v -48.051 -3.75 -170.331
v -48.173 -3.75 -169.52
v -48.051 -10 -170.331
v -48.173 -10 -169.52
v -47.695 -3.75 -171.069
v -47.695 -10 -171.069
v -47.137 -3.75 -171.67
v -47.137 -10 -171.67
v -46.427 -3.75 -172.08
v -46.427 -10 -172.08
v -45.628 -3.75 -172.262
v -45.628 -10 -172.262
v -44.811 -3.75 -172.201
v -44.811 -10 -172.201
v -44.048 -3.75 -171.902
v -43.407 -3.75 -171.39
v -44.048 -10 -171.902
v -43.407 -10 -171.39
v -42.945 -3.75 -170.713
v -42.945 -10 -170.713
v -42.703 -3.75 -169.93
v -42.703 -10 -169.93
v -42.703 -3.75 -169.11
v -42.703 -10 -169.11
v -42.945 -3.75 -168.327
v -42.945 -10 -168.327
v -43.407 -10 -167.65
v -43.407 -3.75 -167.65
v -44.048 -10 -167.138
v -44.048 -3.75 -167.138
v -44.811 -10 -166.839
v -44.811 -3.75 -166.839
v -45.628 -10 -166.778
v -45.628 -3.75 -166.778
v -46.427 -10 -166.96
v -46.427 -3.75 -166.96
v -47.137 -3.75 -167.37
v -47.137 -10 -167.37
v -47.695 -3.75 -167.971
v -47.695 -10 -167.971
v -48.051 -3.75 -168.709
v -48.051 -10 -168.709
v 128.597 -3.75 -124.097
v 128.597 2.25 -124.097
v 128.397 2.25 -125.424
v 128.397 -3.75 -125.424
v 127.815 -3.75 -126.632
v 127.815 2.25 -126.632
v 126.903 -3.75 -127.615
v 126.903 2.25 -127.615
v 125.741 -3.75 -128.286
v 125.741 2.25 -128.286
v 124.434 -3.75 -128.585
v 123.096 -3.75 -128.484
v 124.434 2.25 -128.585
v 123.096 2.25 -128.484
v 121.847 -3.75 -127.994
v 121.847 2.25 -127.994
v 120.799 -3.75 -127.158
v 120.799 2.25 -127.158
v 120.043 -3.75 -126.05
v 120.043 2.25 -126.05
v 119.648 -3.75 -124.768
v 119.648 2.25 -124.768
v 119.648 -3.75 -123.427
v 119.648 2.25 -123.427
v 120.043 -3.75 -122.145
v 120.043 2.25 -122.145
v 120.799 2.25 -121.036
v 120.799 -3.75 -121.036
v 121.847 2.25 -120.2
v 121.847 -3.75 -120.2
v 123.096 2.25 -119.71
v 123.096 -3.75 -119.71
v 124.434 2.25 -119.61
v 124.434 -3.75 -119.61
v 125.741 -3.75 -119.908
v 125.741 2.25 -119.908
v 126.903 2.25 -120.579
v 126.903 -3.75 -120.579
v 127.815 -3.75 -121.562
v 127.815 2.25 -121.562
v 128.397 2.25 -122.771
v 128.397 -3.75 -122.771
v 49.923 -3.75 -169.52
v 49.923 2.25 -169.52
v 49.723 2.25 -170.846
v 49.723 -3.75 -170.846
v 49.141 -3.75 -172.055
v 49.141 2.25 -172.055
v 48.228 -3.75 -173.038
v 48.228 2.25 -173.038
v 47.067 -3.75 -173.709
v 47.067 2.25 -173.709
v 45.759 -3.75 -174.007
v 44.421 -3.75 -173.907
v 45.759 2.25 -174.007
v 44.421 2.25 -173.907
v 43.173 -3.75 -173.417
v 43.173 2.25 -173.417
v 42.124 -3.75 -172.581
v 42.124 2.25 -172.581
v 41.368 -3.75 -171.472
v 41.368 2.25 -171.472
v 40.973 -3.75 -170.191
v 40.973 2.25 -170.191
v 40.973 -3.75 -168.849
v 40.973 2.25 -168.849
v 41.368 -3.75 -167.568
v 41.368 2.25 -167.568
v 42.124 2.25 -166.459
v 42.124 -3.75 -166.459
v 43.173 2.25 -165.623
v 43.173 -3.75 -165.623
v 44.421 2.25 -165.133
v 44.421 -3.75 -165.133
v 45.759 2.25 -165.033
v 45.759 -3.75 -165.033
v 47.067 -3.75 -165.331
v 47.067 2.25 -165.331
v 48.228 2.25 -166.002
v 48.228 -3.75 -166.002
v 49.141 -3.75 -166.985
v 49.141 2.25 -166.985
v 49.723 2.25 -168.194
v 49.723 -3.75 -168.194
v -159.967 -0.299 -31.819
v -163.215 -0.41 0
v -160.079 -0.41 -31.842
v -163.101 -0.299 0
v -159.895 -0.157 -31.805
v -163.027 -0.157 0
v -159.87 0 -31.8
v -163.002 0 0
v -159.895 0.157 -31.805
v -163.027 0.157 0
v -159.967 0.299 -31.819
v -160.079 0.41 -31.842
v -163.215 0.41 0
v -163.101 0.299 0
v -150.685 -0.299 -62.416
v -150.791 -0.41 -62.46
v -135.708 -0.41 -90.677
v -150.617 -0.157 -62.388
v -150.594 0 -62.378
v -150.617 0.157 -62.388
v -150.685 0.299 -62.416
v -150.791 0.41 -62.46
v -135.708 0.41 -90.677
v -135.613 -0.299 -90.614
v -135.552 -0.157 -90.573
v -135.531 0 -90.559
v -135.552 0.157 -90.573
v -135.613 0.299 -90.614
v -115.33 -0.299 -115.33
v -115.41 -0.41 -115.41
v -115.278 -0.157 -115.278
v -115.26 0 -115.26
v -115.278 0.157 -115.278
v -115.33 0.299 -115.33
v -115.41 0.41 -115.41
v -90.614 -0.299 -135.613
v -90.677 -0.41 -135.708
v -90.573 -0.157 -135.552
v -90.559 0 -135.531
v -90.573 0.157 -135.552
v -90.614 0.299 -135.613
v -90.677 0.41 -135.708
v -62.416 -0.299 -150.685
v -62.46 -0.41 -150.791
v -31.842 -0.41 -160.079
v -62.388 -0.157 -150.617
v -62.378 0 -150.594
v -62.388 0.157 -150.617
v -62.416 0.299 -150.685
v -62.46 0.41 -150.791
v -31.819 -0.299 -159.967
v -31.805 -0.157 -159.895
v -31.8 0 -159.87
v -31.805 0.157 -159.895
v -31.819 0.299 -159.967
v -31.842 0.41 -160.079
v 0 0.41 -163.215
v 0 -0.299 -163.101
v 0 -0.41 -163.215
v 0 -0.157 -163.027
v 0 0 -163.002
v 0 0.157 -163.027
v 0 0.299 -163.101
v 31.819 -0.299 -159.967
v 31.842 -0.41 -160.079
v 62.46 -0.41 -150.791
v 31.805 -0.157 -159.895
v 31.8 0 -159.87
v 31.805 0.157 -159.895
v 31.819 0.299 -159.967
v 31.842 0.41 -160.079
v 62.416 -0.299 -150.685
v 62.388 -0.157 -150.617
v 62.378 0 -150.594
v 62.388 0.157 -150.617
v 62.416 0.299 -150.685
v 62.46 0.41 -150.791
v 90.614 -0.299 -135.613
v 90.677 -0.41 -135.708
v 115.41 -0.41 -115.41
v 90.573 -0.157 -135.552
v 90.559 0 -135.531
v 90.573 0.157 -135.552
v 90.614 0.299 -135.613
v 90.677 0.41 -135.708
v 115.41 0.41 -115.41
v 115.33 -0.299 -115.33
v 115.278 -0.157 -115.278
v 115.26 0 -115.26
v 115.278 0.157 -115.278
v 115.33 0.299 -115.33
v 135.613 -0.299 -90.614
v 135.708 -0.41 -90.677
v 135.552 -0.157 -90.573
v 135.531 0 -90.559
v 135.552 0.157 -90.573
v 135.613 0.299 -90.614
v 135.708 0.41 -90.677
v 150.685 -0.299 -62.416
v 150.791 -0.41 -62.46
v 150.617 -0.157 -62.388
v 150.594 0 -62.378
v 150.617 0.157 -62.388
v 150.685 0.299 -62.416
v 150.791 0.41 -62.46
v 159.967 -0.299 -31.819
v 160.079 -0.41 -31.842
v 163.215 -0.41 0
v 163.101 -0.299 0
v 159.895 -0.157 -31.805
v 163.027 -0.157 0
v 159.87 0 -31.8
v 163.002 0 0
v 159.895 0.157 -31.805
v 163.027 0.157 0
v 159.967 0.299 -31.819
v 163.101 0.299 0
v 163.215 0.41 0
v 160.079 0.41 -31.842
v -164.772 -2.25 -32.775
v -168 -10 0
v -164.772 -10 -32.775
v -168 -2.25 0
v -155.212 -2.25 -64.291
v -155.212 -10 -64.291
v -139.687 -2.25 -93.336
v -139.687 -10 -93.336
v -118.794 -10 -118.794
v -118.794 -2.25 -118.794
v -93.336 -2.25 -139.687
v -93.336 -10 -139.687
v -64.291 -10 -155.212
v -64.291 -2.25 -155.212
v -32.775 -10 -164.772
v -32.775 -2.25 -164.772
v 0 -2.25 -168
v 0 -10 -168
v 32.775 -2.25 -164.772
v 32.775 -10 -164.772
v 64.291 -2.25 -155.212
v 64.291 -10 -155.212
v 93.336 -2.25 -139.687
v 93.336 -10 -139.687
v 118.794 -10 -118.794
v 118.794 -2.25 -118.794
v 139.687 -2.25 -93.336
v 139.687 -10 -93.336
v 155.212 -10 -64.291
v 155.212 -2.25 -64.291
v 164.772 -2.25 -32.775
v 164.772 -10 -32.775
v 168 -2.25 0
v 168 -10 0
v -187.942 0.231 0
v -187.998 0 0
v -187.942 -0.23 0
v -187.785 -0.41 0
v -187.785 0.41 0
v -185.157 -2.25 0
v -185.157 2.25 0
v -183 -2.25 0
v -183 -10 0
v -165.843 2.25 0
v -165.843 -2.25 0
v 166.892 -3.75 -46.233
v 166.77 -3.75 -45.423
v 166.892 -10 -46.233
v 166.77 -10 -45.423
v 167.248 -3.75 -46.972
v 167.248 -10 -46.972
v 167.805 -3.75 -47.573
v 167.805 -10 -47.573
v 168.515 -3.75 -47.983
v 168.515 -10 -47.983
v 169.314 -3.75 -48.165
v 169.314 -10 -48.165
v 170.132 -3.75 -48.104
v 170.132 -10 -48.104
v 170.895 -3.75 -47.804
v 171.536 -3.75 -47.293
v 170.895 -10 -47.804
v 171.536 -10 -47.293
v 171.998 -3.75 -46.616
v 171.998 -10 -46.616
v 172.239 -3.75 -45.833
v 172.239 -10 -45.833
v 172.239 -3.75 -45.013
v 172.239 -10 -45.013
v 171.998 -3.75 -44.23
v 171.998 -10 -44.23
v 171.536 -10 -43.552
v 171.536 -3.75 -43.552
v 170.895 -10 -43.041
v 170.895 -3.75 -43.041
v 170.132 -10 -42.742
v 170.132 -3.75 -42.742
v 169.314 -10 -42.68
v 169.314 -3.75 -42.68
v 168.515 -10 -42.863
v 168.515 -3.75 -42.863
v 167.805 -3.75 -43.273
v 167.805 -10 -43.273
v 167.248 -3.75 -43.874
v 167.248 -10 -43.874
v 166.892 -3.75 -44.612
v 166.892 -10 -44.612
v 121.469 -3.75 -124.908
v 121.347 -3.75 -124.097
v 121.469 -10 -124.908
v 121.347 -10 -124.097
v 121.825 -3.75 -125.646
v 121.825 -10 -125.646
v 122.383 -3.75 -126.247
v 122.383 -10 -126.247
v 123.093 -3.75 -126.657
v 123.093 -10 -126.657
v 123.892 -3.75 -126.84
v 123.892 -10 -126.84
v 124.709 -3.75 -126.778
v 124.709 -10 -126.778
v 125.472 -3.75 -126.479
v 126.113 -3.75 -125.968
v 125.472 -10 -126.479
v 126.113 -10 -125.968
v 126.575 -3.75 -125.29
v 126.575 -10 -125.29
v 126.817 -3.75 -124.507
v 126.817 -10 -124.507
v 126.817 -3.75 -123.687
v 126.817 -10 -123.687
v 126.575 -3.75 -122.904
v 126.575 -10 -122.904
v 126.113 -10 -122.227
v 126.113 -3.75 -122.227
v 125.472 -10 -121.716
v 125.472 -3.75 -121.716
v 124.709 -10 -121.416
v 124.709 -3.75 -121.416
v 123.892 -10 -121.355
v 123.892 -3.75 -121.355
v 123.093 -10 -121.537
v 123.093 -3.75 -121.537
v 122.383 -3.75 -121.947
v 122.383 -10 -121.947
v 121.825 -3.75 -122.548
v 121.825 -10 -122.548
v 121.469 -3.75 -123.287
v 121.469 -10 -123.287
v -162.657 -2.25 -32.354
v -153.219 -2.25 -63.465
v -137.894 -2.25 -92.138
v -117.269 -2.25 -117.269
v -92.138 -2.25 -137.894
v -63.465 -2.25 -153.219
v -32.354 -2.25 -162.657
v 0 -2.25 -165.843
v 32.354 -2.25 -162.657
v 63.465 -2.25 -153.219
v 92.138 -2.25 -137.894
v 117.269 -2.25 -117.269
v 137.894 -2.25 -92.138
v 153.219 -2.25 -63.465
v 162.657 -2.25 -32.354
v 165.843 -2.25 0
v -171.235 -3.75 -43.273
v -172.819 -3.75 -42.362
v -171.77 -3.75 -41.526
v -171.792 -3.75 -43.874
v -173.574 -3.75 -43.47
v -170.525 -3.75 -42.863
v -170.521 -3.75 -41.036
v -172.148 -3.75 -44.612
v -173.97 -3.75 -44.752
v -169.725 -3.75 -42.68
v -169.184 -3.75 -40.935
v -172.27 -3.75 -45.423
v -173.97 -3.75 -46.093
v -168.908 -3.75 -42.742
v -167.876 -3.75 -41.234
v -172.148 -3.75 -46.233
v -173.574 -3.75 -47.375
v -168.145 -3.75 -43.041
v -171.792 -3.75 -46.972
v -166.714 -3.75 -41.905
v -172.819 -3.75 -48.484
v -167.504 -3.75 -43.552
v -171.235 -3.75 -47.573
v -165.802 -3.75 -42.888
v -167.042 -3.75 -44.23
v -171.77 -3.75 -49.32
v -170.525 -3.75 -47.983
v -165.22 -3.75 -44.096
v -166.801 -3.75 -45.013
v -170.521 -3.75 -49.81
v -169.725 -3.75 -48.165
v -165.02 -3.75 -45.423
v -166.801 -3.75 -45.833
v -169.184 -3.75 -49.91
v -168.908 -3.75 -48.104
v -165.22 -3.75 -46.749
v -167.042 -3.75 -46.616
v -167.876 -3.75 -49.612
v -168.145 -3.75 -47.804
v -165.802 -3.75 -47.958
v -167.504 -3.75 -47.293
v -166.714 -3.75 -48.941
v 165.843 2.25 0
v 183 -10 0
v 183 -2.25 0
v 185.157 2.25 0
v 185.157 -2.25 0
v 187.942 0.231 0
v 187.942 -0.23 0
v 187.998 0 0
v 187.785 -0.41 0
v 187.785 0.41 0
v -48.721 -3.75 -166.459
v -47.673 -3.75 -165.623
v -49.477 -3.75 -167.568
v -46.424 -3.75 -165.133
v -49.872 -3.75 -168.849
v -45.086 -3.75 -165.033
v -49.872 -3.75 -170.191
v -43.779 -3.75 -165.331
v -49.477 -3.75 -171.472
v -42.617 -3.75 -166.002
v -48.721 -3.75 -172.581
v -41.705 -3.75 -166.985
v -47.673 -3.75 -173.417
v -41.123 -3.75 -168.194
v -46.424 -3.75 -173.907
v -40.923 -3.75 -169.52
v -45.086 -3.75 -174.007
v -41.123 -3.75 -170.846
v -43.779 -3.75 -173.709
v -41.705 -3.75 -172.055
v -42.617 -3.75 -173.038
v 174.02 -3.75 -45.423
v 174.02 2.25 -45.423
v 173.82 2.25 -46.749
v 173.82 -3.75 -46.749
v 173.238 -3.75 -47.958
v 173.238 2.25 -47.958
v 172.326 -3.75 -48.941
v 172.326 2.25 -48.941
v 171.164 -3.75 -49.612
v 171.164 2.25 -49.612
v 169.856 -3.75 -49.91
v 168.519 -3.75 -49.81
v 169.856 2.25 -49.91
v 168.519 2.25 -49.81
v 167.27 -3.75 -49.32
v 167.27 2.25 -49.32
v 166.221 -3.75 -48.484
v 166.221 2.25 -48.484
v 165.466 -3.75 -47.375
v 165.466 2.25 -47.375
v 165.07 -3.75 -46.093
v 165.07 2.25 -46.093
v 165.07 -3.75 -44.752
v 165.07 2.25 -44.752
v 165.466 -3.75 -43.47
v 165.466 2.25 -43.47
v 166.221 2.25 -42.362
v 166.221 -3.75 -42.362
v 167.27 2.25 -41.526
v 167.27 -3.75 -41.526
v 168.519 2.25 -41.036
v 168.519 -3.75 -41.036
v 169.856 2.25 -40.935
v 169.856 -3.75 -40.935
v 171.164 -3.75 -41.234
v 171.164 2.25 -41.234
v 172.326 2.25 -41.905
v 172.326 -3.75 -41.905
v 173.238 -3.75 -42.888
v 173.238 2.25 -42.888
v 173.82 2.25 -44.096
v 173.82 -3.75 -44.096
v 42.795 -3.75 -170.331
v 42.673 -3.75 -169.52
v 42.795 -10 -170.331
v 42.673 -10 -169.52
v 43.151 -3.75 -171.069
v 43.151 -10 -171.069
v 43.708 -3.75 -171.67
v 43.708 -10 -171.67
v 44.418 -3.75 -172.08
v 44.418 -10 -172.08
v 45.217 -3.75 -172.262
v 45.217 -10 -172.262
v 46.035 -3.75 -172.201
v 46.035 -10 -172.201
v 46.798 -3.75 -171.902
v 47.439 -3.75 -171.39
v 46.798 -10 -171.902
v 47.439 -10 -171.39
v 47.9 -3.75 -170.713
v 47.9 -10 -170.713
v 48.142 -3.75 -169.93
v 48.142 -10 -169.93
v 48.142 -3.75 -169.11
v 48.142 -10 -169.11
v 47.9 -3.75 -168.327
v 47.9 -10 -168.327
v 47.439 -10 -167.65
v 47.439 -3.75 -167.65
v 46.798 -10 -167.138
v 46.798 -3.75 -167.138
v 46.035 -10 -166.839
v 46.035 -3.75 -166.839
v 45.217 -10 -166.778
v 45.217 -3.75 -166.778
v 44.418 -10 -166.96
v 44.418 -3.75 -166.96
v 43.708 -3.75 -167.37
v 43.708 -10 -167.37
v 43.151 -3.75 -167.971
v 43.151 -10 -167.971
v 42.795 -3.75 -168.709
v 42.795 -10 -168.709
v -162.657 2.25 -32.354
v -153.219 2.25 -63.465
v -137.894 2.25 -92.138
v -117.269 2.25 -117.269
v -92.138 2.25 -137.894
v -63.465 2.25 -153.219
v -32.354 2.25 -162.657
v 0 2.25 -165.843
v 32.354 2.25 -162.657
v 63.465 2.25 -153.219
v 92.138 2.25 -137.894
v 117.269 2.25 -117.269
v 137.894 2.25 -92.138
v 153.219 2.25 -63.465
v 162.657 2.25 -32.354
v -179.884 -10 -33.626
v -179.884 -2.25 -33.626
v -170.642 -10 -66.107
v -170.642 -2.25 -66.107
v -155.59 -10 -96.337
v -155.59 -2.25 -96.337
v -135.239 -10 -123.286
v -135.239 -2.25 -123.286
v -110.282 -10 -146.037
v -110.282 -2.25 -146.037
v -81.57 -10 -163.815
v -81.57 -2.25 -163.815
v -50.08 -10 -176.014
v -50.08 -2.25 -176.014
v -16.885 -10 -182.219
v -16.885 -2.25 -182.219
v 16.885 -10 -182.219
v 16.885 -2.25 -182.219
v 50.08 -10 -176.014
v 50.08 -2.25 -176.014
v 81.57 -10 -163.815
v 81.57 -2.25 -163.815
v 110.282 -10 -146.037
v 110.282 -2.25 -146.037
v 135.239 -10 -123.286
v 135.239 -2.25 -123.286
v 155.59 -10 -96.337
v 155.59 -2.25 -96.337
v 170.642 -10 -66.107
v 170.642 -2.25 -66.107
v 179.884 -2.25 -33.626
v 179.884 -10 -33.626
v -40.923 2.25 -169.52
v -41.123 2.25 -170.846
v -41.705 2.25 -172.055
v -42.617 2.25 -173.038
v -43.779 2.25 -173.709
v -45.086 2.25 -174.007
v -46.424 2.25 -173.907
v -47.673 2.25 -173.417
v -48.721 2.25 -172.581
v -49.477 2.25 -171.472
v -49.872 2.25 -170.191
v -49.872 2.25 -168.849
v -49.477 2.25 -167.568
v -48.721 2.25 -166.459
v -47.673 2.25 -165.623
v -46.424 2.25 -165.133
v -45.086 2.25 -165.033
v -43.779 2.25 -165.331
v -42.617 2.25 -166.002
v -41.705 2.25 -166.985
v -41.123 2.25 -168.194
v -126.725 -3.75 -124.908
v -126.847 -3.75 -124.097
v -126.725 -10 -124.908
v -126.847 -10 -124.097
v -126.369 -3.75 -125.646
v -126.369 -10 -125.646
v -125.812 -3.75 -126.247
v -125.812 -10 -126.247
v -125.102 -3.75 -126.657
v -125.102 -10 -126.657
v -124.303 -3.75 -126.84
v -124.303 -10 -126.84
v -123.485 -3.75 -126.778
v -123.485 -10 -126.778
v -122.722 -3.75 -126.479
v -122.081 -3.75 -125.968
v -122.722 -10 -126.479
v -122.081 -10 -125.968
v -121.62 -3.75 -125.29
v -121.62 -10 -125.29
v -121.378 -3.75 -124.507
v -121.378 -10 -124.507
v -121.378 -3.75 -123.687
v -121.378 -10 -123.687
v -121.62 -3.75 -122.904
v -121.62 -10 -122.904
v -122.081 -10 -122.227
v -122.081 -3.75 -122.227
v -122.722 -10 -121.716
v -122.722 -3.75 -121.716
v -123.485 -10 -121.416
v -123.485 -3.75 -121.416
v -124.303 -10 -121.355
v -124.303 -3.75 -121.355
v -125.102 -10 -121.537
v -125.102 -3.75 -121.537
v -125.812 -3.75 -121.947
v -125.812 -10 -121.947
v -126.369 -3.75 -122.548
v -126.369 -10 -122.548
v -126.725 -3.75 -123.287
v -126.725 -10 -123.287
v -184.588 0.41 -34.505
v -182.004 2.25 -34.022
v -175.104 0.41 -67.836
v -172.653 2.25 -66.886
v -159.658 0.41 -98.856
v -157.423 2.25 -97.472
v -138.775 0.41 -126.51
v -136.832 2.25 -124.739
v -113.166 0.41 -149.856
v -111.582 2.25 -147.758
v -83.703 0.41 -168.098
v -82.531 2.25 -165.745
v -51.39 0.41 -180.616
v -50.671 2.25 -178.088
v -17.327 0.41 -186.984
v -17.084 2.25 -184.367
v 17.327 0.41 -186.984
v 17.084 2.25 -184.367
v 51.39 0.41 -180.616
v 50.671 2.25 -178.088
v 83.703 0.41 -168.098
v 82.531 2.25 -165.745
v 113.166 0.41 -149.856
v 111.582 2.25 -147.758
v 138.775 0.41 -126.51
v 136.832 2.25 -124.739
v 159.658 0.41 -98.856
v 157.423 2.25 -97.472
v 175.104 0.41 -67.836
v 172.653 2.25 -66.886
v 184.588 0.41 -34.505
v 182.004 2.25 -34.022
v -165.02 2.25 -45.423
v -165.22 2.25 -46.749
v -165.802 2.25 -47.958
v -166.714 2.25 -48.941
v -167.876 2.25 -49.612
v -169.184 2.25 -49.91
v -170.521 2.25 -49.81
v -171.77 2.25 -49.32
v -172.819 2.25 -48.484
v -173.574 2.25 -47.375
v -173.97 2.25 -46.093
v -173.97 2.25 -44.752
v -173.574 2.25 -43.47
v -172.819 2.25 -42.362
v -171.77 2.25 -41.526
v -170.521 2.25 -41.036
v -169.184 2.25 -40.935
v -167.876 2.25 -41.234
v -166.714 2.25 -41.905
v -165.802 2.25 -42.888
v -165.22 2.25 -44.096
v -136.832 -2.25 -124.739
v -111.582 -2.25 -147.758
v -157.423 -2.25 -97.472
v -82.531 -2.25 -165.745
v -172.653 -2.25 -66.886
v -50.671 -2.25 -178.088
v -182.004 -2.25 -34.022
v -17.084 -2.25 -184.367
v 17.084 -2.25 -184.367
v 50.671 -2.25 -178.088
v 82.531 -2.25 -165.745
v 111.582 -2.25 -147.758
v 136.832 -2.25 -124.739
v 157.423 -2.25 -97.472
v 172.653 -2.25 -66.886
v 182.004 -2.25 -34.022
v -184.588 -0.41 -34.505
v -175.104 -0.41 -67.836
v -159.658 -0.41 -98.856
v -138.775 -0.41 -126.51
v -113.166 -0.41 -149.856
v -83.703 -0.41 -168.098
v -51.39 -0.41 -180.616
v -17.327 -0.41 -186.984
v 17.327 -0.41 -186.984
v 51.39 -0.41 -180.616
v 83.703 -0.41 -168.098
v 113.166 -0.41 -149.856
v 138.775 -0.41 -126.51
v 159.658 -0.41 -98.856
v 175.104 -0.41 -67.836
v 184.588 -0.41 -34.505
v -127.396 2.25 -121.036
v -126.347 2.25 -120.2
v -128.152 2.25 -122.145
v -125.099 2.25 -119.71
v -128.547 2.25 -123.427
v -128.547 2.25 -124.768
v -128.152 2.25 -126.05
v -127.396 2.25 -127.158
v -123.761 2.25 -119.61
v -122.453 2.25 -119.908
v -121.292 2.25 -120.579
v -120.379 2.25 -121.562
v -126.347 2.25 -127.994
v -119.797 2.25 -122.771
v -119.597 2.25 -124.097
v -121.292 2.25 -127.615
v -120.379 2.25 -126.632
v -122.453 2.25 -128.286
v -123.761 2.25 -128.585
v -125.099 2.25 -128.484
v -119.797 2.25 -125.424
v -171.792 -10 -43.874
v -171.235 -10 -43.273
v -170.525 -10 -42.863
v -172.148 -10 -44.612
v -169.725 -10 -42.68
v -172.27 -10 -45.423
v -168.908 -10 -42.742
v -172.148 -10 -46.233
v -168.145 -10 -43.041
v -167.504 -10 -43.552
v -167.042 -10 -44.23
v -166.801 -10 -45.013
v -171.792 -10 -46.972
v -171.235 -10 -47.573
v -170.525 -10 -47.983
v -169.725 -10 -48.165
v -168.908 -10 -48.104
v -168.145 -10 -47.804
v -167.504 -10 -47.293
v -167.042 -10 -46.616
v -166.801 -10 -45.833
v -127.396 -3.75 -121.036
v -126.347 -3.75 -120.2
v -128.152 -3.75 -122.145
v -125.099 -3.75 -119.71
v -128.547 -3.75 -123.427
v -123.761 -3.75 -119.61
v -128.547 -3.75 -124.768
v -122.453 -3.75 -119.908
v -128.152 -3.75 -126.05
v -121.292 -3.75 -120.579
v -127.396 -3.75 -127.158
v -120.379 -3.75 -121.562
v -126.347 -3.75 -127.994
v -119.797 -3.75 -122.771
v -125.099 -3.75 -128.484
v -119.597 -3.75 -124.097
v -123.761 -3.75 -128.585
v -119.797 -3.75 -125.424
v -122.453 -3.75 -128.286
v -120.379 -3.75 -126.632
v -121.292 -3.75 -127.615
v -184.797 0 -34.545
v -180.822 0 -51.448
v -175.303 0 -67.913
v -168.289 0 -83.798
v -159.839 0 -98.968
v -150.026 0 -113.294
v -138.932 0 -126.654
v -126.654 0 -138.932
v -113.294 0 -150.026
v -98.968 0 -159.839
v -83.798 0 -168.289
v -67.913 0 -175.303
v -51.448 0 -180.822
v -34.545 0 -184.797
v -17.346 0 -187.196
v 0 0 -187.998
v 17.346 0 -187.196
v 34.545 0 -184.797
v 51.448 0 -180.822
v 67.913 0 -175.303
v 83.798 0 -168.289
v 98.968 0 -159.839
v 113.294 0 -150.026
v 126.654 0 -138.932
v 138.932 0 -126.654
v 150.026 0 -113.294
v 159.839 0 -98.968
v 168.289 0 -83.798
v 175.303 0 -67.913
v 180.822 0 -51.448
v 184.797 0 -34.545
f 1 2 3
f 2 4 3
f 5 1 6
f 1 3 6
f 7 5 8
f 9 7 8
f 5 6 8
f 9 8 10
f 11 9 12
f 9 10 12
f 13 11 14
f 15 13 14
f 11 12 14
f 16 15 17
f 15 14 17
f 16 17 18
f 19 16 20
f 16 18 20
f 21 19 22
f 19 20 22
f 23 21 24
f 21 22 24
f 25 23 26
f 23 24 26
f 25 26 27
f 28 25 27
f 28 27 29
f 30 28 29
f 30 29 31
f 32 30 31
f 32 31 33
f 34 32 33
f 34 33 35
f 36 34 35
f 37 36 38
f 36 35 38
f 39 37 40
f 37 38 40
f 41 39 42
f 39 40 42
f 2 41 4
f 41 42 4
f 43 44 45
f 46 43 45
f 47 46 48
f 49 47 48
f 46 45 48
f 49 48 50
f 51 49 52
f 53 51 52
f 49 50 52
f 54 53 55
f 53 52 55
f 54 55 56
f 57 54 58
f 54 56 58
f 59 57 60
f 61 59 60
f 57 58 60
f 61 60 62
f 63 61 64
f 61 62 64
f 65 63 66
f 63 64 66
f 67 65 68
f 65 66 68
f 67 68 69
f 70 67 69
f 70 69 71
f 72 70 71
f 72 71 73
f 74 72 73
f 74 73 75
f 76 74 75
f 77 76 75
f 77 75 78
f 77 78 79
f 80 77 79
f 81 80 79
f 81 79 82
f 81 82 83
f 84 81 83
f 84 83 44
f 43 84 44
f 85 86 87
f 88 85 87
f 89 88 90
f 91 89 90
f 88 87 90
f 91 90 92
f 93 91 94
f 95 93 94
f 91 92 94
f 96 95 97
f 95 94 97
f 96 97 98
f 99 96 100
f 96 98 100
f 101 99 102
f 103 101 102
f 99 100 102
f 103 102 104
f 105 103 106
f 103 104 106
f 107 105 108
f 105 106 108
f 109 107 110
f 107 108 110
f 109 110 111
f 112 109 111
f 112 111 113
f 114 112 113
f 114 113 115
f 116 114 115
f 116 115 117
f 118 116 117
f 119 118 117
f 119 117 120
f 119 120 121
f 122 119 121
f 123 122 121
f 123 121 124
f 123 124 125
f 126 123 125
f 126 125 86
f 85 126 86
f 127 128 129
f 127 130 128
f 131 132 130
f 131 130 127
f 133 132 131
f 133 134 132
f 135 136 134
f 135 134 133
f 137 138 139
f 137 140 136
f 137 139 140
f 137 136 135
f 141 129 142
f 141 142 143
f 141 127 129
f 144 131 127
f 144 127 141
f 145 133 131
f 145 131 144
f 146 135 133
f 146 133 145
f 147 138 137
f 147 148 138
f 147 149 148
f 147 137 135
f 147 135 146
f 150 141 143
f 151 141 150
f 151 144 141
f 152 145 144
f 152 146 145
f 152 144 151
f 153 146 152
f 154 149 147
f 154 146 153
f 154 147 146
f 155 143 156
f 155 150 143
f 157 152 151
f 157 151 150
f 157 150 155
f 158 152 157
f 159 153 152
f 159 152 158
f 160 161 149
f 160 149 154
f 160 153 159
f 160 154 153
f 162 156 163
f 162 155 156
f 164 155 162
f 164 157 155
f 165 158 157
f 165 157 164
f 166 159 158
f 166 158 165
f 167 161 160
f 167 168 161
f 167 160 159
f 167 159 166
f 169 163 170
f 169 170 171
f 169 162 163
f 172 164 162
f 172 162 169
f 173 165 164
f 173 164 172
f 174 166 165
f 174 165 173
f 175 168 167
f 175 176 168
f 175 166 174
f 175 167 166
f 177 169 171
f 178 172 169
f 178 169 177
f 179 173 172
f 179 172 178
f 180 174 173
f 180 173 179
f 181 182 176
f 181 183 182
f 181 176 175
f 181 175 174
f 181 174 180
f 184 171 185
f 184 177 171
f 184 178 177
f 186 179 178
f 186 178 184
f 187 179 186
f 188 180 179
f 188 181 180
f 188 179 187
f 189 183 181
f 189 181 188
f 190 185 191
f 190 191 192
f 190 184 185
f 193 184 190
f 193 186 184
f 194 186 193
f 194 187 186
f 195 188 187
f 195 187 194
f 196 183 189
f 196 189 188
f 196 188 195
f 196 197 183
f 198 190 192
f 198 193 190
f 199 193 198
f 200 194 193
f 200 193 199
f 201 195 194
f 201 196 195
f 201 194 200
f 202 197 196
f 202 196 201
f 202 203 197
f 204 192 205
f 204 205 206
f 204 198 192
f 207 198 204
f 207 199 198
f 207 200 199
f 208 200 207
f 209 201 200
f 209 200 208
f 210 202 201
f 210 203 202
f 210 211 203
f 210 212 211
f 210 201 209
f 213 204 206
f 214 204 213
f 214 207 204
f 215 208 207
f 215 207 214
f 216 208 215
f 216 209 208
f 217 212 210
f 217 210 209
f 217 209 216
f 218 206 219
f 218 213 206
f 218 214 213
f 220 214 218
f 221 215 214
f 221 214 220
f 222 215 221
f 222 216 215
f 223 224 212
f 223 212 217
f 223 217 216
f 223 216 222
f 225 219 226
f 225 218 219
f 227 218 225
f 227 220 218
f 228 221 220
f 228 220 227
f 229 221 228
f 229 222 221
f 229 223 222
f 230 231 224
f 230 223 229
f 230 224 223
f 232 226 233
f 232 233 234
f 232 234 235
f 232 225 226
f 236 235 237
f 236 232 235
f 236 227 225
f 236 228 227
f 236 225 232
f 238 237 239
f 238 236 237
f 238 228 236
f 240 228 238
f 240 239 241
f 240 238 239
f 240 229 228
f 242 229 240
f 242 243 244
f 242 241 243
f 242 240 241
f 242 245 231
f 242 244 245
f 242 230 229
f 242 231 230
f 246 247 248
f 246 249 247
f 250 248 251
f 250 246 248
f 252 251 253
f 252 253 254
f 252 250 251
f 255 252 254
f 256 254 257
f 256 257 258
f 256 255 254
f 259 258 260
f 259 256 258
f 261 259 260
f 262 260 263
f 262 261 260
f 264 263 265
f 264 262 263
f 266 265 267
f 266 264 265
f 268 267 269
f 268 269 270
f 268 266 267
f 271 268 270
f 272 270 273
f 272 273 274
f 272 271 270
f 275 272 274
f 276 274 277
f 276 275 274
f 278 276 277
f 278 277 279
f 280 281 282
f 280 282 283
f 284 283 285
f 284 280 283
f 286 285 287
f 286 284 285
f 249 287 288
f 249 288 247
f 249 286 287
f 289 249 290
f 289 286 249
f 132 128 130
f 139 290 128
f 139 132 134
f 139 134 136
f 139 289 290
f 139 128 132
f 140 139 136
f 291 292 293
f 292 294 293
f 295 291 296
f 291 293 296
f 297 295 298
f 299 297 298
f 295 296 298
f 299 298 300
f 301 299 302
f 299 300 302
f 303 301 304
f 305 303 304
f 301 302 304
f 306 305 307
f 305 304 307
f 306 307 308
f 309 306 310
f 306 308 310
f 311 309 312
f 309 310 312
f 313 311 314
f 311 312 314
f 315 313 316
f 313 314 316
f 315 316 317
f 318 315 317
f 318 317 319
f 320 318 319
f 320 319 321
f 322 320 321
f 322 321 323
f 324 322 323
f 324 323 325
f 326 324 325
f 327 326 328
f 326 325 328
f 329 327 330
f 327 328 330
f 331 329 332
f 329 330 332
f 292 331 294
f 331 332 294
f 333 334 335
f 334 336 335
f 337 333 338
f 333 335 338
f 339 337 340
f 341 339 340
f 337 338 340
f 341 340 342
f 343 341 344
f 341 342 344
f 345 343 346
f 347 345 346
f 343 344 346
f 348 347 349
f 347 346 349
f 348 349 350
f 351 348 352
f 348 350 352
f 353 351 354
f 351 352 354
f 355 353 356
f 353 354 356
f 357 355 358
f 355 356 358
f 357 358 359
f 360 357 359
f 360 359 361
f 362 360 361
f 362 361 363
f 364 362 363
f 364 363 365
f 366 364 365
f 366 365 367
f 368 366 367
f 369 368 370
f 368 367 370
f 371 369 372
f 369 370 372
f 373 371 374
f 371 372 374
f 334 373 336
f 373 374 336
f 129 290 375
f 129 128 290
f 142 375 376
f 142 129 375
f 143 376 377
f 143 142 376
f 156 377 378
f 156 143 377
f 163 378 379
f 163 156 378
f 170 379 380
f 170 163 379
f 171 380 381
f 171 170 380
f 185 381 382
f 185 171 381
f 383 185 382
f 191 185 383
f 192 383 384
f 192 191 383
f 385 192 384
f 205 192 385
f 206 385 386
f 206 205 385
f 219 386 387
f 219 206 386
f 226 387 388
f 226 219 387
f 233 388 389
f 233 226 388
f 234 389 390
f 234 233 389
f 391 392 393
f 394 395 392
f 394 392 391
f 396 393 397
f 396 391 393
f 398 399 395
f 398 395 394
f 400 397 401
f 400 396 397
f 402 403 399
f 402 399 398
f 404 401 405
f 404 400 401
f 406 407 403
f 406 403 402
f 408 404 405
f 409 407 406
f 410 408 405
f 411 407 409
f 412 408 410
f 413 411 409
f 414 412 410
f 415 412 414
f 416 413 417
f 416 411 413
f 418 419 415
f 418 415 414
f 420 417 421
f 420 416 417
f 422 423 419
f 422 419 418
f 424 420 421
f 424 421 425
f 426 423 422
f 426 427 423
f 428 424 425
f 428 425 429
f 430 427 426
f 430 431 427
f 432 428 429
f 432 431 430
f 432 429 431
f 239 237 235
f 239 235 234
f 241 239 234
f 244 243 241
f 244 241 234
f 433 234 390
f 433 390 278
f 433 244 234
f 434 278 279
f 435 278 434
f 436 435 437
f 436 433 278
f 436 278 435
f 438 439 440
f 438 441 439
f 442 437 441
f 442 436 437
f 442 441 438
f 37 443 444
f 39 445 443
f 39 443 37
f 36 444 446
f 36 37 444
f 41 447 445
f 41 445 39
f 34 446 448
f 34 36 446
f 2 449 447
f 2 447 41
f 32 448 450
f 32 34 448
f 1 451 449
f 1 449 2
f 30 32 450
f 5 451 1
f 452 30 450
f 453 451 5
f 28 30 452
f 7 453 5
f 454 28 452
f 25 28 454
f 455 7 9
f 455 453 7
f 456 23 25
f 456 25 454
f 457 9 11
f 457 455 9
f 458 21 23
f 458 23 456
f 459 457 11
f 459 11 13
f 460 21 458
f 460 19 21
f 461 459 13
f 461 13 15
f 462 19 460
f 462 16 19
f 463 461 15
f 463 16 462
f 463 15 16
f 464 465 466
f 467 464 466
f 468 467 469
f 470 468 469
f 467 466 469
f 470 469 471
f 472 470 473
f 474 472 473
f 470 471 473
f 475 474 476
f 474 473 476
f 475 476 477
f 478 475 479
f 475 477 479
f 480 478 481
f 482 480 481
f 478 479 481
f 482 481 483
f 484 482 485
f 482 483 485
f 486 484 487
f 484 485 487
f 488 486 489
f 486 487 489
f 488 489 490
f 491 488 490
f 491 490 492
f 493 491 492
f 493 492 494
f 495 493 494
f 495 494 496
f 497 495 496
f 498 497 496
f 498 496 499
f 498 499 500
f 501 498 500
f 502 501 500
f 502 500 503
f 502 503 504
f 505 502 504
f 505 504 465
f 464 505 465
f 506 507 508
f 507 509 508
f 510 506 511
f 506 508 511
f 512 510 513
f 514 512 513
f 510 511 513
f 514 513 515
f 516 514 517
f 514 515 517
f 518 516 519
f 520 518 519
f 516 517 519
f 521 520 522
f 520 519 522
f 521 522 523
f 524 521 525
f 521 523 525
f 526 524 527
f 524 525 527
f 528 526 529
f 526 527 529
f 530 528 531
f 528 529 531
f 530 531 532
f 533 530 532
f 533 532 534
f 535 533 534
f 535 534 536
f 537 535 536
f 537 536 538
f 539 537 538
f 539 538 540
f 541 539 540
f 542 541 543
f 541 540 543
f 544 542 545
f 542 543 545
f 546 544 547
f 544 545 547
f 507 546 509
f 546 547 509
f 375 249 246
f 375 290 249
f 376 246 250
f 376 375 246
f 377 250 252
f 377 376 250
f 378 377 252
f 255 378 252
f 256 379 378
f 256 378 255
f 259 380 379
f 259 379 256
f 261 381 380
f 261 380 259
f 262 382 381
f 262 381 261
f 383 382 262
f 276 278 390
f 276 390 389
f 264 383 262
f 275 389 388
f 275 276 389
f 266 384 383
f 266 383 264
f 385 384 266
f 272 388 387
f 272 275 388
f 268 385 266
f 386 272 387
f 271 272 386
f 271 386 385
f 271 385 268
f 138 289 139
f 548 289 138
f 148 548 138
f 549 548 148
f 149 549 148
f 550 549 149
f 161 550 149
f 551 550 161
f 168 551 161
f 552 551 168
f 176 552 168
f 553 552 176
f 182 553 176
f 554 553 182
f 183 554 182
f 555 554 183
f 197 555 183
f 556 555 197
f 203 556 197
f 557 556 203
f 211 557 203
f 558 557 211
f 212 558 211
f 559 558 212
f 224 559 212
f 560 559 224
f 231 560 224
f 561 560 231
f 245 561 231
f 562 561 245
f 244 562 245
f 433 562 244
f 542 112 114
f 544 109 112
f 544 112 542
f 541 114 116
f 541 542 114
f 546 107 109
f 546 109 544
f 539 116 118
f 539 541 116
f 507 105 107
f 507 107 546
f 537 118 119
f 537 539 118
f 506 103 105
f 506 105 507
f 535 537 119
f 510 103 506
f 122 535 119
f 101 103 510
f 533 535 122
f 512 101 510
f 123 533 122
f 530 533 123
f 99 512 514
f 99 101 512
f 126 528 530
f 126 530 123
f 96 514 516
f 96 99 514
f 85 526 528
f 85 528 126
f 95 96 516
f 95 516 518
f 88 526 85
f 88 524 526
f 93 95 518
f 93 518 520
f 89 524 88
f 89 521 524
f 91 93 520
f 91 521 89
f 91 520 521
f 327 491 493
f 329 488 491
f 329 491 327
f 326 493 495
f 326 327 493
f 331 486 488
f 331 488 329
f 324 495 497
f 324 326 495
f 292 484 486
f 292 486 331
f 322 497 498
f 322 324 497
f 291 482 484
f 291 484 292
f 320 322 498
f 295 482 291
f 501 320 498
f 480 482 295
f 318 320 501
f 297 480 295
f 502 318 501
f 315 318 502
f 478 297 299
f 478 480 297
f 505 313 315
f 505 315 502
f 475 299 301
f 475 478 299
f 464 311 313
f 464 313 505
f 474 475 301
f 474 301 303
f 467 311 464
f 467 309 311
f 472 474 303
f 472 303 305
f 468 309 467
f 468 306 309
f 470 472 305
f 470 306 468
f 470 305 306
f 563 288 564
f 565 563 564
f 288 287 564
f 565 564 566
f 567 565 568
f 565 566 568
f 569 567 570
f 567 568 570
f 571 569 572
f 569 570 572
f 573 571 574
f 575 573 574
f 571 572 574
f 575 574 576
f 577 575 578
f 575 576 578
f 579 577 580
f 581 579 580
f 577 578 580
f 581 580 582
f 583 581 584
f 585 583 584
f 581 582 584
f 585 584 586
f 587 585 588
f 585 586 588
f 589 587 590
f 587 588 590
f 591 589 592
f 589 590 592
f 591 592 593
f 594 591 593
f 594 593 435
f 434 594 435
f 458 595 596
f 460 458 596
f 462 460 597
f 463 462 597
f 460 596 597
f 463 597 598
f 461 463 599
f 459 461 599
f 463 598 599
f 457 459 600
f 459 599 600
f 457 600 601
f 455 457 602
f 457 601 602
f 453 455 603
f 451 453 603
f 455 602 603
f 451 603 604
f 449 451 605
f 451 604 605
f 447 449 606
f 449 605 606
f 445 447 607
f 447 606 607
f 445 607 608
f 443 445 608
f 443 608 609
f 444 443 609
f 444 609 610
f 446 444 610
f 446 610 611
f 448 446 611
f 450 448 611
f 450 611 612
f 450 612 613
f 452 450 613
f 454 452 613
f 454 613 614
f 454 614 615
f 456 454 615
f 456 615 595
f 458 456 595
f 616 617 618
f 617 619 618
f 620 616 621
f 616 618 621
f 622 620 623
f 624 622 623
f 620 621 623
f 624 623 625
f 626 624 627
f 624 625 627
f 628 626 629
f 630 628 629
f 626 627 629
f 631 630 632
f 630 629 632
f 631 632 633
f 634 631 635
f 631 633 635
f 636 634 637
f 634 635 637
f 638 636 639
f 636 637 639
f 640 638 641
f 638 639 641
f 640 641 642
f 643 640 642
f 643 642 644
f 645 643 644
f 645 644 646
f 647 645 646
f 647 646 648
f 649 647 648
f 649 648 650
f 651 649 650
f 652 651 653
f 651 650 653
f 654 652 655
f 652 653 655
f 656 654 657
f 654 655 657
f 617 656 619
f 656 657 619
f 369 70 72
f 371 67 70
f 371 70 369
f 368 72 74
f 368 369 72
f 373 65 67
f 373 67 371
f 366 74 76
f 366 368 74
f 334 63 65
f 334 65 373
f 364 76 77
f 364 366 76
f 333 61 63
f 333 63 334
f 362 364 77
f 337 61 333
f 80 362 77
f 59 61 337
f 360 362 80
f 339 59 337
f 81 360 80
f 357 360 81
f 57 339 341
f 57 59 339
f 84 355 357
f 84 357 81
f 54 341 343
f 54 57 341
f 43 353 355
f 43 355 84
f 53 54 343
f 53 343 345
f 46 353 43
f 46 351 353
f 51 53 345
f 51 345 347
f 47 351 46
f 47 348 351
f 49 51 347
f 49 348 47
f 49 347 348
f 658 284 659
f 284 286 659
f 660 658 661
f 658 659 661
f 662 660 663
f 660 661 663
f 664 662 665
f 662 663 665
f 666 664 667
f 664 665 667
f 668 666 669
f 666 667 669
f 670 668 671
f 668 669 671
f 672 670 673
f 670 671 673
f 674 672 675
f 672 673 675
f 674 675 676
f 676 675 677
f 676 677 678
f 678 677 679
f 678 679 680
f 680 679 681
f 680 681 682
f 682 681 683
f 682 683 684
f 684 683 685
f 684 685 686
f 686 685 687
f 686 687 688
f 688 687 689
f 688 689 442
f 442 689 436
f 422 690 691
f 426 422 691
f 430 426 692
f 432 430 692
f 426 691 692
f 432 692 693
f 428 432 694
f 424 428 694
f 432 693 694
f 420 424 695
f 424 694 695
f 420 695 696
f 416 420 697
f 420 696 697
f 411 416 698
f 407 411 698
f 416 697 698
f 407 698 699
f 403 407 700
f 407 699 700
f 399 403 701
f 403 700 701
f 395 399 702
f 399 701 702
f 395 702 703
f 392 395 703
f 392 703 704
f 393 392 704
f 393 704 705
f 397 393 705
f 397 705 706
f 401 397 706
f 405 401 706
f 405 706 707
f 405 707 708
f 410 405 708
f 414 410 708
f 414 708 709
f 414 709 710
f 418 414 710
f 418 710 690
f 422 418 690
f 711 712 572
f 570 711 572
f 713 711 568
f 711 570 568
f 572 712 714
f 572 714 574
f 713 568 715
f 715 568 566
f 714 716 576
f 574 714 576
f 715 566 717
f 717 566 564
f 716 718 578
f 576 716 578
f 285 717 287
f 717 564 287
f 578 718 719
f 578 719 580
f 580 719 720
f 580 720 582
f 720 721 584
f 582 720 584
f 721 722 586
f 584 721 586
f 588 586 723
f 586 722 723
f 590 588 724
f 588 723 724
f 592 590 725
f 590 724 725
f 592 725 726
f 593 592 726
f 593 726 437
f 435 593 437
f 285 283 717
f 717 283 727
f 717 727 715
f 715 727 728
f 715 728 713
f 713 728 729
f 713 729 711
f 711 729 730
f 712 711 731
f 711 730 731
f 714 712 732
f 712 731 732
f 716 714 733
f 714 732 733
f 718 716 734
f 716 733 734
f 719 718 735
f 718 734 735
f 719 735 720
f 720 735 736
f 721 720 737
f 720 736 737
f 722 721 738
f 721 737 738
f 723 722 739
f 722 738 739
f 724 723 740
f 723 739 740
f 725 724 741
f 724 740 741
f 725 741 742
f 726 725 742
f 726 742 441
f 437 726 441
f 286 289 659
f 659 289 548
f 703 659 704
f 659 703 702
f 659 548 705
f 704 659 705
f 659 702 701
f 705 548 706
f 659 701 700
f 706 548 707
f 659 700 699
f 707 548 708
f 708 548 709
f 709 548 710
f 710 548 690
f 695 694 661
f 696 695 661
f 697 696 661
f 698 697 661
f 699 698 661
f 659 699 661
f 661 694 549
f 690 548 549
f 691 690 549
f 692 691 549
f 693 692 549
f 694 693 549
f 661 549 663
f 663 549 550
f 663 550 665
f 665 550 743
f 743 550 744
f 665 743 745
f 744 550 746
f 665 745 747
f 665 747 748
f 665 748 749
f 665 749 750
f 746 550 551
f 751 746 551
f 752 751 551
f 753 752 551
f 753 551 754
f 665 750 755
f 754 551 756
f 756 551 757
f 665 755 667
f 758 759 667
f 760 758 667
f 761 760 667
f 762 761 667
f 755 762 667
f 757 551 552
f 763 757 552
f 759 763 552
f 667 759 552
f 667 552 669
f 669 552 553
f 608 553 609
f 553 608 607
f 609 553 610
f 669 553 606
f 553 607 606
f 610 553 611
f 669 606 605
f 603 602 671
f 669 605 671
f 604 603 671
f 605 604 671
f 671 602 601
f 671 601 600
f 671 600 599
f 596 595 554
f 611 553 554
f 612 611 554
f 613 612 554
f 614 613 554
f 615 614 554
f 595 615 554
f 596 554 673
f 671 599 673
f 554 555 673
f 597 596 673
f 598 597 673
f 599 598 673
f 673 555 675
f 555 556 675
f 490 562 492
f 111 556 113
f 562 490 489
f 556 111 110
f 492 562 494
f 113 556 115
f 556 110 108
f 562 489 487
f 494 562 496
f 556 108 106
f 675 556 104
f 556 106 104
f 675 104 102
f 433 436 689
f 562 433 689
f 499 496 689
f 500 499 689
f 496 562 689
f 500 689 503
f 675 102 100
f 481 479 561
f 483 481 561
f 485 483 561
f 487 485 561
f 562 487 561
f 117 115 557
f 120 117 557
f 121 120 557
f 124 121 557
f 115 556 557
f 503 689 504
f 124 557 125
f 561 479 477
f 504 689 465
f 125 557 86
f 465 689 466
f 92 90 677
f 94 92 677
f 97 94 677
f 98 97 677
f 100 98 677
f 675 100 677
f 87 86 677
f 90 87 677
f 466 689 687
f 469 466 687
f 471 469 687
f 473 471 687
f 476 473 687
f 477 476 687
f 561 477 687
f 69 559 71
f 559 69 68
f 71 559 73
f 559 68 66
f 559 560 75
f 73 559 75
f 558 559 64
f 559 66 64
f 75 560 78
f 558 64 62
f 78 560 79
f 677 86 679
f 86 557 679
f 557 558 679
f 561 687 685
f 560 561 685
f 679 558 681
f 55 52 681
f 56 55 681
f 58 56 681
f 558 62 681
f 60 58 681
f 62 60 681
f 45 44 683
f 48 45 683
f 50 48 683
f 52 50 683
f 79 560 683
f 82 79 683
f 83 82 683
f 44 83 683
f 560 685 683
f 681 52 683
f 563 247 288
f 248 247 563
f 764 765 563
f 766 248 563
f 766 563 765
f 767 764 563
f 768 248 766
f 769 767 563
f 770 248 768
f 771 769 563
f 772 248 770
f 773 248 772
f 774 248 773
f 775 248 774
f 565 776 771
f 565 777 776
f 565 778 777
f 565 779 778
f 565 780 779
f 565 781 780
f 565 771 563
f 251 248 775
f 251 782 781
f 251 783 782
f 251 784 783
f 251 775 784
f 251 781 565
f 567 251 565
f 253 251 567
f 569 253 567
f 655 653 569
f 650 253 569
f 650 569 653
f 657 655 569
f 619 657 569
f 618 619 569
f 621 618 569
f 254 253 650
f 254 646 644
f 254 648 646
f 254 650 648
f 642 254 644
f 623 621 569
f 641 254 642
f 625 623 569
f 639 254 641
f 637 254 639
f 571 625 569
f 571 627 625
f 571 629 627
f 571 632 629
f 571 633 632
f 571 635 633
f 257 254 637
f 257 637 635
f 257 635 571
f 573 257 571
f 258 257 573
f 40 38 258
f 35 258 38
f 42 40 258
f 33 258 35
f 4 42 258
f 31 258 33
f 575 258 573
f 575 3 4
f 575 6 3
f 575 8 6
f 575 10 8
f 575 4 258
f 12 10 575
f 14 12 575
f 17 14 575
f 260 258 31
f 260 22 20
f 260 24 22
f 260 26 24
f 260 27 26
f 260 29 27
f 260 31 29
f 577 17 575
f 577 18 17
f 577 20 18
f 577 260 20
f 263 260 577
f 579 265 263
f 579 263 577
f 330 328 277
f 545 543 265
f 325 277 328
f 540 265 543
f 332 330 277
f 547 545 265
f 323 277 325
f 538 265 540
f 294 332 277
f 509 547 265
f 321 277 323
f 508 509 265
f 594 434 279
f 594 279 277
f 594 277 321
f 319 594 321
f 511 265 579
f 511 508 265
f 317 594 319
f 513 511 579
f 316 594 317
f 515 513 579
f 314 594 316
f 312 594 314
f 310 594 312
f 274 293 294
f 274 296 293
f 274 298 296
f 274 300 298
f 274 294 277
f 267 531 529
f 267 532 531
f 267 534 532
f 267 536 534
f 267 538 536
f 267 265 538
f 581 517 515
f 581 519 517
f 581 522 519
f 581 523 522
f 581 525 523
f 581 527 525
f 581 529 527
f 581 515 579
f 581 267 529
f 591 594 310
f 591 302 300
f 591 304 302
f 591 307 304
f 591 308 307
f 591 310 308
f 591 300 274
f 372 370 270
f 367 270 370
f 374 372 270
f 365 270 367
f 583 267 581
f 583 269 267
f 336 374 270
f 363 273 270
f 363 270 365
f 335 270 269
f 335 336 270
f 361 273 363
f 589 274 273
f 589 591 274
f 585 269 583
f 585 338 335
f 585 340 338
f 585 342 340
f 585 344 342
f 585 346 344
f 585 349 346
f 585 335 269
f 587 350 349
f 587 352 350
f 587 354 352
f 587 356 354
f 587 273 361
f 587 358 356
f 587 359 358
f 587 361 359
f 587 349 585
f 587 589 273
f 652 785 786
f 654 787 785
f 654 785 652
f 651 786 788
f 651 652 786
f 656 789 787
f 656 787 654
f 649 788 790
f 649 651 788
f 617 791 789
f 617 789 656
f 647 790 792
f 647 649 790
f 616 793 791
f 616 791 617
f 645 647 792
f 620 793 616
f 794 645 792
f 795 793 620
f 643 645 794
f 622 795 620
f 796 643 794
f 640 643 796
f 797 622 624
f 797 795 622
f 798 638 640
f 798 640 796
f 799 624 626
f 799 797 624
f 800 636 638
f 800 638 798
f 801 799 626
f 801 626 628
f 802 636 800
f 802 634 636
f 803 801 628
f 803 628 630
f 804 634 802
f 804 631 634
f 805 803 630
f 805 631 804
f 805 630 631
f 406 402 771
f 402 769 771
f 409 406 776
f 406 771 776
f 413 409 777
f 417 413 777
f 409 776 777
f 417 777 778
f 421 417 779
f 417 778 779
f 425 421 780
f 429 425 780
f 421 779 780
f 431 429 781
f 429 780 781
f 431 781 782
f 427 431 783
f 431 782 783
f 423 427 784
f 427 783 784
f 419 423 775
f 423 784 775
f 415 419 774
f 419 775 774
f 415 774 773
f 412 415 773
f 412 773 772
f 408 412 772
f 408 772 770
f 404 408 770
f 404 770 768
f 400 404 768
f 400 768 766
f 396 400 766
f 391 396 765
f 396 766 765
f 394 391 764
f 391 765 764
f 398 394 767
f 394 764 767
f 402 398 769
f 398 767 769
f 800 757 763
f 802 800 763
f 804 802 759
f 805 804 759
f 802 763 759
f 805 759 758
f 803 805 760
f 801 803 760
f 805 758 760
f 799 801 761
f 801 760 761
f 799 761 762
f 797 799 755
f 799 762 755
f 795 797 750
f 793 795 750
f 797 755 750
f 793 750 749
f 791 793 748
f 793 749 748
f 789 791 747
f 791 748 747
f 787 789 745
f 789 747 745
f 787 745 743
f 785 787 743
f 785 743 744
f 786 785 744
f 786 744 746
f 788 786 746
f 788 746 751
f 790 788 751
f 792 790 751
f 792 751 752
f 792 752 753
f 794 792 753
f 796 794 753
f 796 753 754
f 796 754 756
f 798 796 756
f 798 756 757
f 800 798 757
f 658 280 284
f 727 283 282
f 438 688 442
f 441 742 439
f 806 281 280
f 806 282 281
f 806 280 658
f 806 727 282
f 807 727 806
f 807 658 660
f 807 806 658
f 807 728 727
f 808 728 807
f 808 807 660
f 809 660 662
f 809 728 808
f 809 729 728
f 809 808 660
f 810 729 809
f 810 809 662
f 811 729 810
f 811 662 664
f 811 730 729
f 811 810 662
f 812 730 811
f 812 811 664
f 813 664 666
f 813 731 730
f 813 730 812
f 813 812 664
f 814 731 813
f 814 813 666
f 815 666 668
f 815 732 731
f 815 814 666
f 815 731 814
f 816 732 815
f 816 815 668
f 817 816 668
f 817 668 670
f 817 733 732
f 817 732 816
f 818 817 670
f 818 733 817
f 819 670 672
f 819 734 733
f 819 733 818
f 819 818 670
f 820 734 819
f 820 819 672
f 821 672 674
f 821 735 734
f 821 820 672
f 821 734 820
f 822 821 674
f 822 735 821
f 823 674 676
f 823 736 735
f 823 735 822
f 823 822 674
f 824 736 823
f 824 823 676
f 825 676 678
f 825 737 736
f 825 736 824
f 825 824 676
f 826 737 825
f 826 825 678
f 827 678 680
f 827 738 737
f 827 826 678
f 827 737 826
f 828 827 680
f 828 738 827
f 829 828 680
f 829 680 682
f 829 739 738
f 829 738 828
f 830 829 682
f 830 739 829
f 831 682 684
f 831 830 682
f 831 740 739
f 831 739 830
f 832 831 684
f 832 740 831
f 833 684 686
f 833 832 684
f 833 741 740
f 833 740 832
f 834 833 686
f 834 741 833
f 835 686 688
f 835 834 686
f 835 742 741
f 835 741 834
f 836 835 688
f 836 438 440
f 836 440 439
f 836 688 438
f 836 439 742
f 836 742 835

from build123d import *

# Parameters (mm, degrees)
SKETCH_2_R                   = 183
EXTRUDE_1_DEPTH              = 7.75
HOLE_WIZARD_M5_1_D           = 5.5
HOLE_WIZARD_M5_1_CBORE_D     = 9
HOLE_WIZARD_M5_1_CBORE_DEPTH = 6
SKETCH_6_W                   = 499.91157149
SKETCH_6_H                   = 215.35218654
CUT_EXTRUDE_1_DEPTH          = 267.151754372


with BuildPart() as part:
    # 草图1 → 旋转1 (revolve)
    with BuildSketch(Plane.XY, mode=Mode.PRIVATE) as revolve_1_sk:
        with BuildLine():
            Line((185.156666985, 2.25), (0, 2.25))
            Line((0, 2.25), (0, -2.25))
            Line((0, -2.25), (185.156666985, -2.25))
            Line((185.156666985, -2.25), (187.78506482, -0.409576022))
            add(Edge.make_bspline(
                [(187.78506482, 0.409576022), (187.830906121, 0.377477598), (187.871837762, 0.337021948), (187.904470176, 0.291559224), (187.937102589, 0.246096499), (187.962335818, 0.194372782), (187.978080287, 0.140671335), (187.993824756, 0.086969887), (188.000514717, 0.029809558), (187.997596172, -0.026076181), (187.994677627, -0.08196192), (187.982070079, -0.138114466), (187.960817564, -0.189883804), (187.939565048, -0.241653142), (187.909081396, -0.290467133), (187.87189097, -0.332283469), (187.846140091, -0.361237358), (187.816805619, -0.387350876), (187.78506482, -0.409576022)],
                knots=[0, 0, 0, 0, 0.000167886, 0.000167886, 0.000167886, 0.000335771, 0.000335771, 0.000335771, 0.000503657, 0.000503657, 0.000503657, 0.000671543, 0.000671543, 0.000671543, 0.000839428, 0.000839428, 0.000839428, 0.000954806, 0.000954806, 0.000954806, 0.000954806], degree=3))
            Line((187.78506482, 0.409576022), (185.156666985, 2.25))
        make_face()
    revolve(revolve_1_sk.sketch.rotate(Axis((0, 2.25, 0), (0, -1, 0)), 270), axis=Axis((0, 2.25, 0), (0, -1, 0)))

    # 草图2 → 凸台-拉伸1 (add)
    with BuildSketch(Plane.XZ.offset(2.25)):
        with Locations(Location((0, 0, 0), (0, 0, 270))):
            Circle(SKETCH_2_R)
    extrude(amount=EXTRUDE_1_DEPTH)

    # 草图3 → 切除-旋转1 (revolve, cut)
    with BuildSketch(Plane.XY, mode=Mode.PRIVATE) as cut_revolve_1_sk:
        with BuildLine():
            Line((165.843333015, 2.25), (0, 2.25))
            Line((0, 2.25), (0, -10))
            Line((0, -10), (168, -10))
            Line((168, -10), (168, -2.25))
            Line((168, -2.25), (165.843333015, -2.25))
            Line((165.843333015, -2.25), (163.21493518, -0.409576022))
            ThreePointArc((163.21493518, -0.409576022), (163.001723398, 0), (163.21493518, 0.409576022))
            Line((163.21493518, 0.409576022), (165.843333015, 2.25))
        make_face()
    revolve(cut_revolve_1_sk.sketch.rotate(Axis((0, 2.25, 0), (0, -1, 0)), 270), axis=Axis((0, 2.25, 0), (0, -1, 0)), mode=Mode.SUBTRACT)

    # M5 六角头螺栓的柱形沉头孔1 (through all)
    with Locations(Plane(origin=(0, 2.25, 0), x_dir=(1, 0, 0), z_dir=(0, 1, 0))):
        with Locations((-45.422742415, -169.519982514), (-124.097240098, -124.097240098), (-169.519982514, -45.422742415), (45.422742415, -169.519982514), (124.097240098, -124.097240098), (169.519982514, -45.422742415), (-45.422742415, 169.519982514), (-124.097240098, 124.097240098), (-169.519982514, 45.422742415), (45.422742415, 169.519982514), (124.097240098, 124.097240098), (169.519982514, 45.422742415)):
            CounterBoreHole(HOLE_WIZARD_M5_1_D / 2, HOLE_WIZARD_M5_1_CBORE_D / 2, HOLE_WIZARD_M5_1_CBORE_DEPTH)

    # 草图6 → 切除-拉伸1 (cut, through all)
    with BuildSketch(Plane(origin=(0, 2.25, 0), x_dir=(1, 0, 0), z_dir=(0, 1, 0))):
        with Locations((-5.153727541, -107.67609327)):
            Rectangle(SKETCH_6_W, SKETCH_6_H)
    extrude(amount=-CUT_EXTRUDE_1_DEPTH, mode=Mode.SUBTRACT)


solid = part.part
